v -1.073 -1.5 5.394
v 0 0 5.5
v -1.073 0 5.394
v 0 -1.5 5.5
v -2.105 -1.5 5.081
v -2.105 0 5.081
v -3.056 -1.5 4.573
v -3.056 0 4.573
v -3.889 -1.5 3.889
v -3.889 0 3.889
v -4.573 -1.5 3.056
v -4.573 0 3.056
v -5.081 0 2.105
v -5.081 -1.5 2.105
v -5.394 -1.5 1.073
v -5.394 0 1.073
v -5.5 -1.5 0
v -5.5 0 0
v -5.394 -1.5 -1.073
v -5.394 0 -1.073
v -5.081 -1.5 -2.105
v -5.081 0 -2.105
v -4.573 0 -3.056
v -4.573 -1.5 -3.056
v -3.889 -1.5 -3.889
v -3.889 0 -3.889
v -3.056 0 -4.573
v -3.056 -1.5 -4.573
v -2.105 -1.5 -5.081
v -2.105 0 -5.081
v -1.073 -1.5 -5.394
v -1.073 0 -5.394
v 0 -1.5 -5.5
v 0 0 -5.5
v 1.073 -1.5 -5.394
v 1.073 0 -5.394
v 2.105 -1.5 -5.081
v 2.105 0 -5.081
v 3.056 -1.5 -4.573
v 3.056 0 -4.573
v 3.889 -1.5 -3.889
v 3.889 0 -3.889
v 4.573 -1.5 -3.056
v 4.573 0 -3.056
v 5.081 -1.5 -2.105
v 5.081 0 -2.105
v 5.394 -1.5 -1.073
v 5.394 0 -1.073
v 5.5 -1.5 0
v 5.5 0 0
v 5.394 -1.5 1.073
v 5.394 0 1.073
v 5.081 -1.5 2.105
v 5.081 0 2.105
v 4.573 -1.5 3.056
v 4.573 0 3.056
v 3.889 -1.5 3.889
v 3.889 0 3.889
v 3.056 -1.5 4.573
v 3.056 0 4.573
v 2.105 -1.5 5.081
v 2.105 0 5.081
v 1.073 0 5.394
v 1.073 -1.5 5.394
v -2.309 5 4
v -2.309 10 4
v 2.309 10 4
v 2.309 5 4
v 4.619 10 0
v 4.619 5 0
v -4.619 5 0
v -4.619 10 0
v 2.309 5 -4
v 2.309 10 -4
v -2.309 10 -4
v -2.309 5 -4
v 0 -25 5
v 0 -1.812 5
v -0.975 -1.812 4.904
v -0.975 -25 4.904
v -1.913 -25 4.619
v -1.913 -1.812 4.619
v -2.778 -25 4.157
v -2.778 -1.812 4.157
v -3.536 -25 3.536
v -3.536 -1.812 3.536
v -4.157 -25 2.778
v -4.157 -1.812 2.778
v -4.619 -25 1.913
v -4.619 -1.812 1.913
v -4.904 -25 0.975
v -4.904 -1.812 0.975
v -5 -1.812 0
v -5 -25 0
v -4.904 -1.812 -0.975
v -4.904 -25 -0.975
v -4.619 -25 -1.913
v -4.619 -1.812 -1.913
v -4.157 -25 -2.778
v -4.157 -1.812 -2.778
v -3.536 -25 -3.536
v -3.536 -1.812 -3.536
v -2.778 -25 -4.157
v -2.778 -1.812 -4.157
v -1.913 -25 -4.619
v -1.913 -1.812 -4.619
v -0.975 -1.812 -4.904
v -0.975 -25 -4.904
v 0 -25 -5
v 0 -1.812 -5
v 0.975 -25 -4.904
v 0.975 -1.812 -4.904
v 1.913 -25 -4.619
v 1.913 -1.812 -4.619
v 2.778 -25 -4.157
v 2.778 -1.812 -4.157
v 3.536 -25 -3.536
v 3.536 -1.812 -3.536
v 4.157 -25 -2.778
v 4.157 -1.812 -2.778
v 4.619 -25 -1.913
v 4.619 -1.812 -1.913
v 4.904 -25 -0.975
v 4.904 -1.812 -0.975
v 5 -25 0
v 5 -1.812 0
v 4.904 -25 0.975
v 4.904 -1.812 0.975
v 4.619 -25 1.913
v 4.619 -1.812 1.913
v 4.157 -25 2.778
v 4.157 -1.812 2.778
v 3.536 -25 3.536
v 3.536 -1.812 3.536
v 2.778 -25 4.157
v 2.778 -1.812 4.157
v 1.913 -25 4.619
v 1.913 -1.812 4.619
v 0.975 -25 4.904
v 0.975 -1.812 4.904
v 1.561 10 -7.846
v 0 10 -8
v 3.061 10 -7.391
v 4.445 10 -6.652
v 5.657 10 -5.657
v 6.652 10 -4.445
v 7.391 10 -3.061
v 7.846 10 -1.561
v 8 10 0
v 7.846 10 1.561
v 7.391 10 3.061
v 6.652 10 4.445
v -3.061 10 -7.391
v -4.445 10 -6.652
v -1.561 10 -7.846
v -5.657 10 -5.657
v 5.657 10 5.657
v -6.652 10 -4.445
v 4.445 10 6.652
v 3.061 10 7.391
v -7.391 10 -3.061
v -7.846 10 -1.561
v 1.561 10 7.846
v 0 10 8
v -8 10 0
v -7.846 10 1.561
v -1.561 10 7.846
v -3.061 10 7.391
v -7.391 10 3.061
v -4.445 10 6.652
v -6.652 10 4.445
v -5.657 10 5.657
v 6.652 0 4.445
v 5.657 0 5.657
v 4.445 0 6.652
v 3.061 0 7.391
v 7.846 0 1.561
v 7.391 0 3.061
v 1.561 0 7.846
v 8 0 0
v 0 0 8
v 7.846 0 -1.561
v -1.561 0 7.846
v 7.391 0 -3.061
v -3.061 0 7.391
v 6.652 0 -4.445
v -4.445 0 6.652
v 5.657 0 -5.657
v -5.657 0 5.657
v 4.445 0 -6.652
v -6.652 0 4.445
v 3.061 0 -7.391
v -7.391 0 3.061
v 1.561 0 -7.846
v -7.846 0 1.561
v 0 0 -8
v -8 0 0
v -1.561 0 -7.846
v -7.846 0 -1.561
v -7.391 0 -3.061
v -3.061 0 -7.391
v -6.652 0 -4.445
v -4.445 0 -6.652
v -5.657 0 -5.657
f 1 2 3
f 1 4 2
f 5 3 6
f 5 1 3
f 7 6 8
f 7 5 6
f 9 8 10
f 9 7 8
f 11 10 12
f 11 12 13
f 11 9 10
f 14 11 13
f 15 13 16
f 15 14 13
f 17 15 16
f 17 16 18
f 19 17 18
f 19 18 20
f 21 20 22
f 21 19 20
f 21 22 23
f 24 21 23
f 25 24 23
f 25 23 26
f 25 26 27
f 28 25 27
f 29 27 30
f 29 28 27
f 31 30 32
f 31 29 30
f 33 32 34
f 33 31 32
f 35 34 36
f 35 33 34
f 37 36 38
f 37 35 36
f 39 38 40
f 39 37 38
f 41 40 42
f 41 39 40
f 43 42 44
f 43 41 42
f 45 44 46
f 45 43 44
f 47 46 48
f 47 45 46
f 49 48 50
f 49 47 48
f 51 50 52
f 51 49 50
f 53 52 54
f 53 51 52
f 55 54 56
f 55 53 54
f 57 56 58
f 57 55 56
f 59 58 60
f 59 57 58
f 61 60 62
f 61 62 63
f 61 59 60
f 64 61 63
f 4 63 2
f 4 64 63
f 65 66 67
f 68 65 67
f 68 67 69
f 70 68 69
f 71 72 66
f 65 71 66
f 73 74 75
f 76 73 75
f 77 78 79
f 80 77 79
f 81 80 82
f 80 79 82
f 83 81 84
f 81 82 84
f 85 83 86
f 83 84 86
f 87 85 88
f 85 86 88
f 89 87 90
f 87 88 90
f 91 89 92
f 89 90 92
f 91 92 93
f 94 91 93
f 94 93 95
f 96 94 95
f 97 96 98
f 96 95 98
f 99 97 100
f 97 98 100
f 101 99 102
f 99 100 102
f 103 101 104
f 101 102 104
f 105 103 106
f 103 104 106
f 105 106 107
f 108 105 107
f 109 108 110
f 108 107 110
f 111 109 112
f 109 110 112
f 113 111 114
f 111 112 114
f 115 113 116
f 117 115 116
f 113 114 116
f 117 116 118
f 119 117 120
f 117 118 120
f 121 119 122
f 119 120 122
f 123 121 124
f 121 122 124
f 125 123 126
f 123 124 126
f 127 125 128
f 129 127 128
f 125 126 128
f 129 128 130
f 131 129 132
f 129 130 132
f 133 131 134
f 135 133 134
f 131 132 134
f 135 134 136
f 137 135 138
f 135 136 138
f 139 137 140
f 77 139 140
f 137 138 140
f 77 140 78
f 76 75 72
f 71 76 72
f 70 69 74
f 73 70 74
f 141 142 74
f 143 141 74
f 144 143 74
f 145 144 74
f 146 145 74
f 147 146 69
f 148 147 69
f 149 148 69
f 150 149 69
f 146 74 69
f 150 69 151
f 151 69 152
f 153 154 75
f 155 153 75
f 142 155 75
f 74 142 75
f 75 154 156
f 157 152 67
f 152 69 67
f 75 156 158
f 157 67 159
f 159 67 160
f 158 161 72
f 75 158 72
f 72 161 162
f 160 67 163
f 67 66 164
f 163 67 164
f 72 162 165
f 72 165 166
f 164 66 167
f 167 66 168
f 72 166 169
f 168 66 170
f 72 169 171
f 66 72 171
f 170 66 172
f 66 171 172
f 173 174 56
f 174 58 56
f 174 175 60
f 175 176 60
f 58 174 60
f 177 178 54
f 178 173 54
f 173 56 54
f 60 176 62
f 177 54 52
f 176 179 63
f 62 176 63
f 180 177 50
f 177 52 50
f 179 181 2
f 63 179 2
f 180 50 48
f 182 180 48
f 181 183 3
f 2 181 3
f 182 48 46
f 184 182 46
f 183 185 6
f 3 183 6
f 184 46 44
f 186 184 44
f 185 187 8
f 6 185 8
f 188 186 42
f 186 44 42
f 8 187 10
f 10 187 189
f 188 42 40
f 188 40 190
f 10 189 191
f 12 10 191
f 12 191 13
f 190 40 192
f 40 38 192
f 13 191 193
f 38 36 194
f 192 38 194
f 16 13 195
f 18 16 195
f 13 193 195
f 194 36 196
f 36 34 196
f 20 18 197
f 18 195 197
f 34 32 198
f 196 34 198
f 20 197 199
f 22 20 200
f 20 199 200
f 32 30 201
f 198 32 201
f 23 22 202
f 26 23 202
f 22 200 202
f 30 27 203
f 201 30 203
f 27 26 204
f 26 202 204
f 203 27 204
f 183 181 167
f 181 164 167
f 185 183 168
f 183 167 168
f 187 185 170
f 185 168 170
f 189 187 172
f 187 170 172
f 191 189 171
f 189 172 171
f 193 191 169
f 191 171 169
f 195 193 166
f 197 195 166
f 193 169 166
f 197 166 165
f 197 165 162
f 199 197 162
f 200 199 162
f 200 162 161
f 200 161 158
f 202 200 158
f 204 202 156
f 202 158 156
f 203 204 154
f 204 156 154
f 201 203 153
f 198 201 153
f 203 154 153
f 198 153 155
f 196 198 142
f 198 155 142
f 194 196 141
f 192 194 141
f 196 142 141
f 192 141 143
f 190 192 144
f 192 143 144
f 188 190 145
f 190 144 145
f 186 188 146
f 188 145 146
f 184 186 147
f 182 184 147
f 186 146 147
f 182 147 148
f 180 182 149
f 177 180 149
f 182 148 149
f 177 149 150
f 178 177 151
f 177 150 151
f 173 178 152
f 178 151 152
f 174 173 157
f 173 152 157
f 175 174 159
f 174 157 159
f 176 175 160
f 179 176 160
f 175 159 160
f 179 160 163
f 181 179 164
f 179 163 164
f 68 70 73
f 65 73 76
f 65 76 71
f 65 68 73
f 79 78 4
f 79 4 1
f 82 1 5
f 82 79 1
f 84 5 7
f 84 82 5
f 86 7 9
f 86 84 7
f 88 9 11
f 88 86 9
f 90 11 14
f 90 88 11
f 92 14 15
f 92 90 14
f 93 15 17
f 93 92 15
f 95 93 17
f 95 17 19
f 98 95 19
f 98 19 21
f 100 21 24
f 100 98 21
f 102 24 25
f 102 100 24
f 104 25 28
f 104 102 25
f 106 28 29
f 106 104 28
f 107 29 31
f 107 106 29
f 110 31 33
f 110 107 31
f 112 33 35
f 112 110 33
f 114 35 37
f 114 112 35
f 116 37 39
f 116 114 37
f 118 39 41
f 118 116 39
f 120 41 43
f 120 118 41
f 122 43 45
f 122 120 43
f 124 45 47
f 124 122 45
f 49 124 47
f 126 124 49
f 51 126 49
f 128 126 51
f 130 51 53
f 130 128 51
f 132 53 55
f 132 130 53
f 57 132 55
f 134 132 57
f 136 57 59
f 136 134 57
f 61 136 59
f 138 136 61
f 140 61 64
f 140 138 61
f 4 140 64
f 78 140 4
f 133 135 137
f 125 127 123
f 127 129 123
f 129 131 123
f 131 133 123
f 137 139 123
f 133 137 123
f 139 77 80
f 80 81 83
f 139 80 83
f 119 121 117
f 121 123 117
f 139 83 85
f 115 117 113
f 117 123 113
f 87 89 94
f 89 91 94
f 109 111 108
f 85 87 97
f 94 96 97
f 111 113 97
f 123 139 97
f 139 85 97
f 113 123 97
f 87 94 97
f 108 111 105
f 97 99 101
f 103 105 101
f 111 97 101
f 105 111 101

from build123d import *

# Parameters (mm, degrees)
CUT_EXTRUDE1_DEPTH = 5


with BuildPart() as part:
    # Sketch1 → Revolve1 (revolve)
    with BuildSketch(Plane.XY, mode=Mode.PRIVATE) as revolve1_sk:
        Polygon((0, -25), (5, -25), (5, 0), (8, 0), (8, 10), (0, 10), align=None)
    revolve(revolve1_sk.sketch.rotate(Axis((0, 61.691642626, 0), (0, -1, 0)), 90), axis=Axis((0, 61.691642626, 0), (0, -1, 0)))

    # Sketch2 → Cut-Extrude1 (cut)
    with BuildSketch(Plane(origin=(0, 10, 0), x_dir=(-1, 0, 0), z_dir=(0, 1, 0))):
        Polygon((-2.309401077, -4), (2.309401077, -4), (4.618802154, 0), (2.309401077, 4), (-2.309401077, 4), (-4.618802154, 0), align=None)
    extrude(amount=-CUT_EXTRUDE1_DEPTH, mode=Mode.SUBTRACT)

    # Sketch3 → O-ring relief in hole (revolve)
    with BuildSketch(Plane.XY, mode=Mode.PRIVATE) as o_ring_relief_in_hole_sk:
        Polygon((0, 0), (5.5, 0), (5.5, -1.5), (0, -4.936781436), align=None)
    revolve(o_ring_relief_in_hole_sk.sketch.rotate(Axis((0, 0, 0), (0, -1, 0)), 90), axis=Axis((0, 0, 0), (0, -1, 0)))


solid = part.part
